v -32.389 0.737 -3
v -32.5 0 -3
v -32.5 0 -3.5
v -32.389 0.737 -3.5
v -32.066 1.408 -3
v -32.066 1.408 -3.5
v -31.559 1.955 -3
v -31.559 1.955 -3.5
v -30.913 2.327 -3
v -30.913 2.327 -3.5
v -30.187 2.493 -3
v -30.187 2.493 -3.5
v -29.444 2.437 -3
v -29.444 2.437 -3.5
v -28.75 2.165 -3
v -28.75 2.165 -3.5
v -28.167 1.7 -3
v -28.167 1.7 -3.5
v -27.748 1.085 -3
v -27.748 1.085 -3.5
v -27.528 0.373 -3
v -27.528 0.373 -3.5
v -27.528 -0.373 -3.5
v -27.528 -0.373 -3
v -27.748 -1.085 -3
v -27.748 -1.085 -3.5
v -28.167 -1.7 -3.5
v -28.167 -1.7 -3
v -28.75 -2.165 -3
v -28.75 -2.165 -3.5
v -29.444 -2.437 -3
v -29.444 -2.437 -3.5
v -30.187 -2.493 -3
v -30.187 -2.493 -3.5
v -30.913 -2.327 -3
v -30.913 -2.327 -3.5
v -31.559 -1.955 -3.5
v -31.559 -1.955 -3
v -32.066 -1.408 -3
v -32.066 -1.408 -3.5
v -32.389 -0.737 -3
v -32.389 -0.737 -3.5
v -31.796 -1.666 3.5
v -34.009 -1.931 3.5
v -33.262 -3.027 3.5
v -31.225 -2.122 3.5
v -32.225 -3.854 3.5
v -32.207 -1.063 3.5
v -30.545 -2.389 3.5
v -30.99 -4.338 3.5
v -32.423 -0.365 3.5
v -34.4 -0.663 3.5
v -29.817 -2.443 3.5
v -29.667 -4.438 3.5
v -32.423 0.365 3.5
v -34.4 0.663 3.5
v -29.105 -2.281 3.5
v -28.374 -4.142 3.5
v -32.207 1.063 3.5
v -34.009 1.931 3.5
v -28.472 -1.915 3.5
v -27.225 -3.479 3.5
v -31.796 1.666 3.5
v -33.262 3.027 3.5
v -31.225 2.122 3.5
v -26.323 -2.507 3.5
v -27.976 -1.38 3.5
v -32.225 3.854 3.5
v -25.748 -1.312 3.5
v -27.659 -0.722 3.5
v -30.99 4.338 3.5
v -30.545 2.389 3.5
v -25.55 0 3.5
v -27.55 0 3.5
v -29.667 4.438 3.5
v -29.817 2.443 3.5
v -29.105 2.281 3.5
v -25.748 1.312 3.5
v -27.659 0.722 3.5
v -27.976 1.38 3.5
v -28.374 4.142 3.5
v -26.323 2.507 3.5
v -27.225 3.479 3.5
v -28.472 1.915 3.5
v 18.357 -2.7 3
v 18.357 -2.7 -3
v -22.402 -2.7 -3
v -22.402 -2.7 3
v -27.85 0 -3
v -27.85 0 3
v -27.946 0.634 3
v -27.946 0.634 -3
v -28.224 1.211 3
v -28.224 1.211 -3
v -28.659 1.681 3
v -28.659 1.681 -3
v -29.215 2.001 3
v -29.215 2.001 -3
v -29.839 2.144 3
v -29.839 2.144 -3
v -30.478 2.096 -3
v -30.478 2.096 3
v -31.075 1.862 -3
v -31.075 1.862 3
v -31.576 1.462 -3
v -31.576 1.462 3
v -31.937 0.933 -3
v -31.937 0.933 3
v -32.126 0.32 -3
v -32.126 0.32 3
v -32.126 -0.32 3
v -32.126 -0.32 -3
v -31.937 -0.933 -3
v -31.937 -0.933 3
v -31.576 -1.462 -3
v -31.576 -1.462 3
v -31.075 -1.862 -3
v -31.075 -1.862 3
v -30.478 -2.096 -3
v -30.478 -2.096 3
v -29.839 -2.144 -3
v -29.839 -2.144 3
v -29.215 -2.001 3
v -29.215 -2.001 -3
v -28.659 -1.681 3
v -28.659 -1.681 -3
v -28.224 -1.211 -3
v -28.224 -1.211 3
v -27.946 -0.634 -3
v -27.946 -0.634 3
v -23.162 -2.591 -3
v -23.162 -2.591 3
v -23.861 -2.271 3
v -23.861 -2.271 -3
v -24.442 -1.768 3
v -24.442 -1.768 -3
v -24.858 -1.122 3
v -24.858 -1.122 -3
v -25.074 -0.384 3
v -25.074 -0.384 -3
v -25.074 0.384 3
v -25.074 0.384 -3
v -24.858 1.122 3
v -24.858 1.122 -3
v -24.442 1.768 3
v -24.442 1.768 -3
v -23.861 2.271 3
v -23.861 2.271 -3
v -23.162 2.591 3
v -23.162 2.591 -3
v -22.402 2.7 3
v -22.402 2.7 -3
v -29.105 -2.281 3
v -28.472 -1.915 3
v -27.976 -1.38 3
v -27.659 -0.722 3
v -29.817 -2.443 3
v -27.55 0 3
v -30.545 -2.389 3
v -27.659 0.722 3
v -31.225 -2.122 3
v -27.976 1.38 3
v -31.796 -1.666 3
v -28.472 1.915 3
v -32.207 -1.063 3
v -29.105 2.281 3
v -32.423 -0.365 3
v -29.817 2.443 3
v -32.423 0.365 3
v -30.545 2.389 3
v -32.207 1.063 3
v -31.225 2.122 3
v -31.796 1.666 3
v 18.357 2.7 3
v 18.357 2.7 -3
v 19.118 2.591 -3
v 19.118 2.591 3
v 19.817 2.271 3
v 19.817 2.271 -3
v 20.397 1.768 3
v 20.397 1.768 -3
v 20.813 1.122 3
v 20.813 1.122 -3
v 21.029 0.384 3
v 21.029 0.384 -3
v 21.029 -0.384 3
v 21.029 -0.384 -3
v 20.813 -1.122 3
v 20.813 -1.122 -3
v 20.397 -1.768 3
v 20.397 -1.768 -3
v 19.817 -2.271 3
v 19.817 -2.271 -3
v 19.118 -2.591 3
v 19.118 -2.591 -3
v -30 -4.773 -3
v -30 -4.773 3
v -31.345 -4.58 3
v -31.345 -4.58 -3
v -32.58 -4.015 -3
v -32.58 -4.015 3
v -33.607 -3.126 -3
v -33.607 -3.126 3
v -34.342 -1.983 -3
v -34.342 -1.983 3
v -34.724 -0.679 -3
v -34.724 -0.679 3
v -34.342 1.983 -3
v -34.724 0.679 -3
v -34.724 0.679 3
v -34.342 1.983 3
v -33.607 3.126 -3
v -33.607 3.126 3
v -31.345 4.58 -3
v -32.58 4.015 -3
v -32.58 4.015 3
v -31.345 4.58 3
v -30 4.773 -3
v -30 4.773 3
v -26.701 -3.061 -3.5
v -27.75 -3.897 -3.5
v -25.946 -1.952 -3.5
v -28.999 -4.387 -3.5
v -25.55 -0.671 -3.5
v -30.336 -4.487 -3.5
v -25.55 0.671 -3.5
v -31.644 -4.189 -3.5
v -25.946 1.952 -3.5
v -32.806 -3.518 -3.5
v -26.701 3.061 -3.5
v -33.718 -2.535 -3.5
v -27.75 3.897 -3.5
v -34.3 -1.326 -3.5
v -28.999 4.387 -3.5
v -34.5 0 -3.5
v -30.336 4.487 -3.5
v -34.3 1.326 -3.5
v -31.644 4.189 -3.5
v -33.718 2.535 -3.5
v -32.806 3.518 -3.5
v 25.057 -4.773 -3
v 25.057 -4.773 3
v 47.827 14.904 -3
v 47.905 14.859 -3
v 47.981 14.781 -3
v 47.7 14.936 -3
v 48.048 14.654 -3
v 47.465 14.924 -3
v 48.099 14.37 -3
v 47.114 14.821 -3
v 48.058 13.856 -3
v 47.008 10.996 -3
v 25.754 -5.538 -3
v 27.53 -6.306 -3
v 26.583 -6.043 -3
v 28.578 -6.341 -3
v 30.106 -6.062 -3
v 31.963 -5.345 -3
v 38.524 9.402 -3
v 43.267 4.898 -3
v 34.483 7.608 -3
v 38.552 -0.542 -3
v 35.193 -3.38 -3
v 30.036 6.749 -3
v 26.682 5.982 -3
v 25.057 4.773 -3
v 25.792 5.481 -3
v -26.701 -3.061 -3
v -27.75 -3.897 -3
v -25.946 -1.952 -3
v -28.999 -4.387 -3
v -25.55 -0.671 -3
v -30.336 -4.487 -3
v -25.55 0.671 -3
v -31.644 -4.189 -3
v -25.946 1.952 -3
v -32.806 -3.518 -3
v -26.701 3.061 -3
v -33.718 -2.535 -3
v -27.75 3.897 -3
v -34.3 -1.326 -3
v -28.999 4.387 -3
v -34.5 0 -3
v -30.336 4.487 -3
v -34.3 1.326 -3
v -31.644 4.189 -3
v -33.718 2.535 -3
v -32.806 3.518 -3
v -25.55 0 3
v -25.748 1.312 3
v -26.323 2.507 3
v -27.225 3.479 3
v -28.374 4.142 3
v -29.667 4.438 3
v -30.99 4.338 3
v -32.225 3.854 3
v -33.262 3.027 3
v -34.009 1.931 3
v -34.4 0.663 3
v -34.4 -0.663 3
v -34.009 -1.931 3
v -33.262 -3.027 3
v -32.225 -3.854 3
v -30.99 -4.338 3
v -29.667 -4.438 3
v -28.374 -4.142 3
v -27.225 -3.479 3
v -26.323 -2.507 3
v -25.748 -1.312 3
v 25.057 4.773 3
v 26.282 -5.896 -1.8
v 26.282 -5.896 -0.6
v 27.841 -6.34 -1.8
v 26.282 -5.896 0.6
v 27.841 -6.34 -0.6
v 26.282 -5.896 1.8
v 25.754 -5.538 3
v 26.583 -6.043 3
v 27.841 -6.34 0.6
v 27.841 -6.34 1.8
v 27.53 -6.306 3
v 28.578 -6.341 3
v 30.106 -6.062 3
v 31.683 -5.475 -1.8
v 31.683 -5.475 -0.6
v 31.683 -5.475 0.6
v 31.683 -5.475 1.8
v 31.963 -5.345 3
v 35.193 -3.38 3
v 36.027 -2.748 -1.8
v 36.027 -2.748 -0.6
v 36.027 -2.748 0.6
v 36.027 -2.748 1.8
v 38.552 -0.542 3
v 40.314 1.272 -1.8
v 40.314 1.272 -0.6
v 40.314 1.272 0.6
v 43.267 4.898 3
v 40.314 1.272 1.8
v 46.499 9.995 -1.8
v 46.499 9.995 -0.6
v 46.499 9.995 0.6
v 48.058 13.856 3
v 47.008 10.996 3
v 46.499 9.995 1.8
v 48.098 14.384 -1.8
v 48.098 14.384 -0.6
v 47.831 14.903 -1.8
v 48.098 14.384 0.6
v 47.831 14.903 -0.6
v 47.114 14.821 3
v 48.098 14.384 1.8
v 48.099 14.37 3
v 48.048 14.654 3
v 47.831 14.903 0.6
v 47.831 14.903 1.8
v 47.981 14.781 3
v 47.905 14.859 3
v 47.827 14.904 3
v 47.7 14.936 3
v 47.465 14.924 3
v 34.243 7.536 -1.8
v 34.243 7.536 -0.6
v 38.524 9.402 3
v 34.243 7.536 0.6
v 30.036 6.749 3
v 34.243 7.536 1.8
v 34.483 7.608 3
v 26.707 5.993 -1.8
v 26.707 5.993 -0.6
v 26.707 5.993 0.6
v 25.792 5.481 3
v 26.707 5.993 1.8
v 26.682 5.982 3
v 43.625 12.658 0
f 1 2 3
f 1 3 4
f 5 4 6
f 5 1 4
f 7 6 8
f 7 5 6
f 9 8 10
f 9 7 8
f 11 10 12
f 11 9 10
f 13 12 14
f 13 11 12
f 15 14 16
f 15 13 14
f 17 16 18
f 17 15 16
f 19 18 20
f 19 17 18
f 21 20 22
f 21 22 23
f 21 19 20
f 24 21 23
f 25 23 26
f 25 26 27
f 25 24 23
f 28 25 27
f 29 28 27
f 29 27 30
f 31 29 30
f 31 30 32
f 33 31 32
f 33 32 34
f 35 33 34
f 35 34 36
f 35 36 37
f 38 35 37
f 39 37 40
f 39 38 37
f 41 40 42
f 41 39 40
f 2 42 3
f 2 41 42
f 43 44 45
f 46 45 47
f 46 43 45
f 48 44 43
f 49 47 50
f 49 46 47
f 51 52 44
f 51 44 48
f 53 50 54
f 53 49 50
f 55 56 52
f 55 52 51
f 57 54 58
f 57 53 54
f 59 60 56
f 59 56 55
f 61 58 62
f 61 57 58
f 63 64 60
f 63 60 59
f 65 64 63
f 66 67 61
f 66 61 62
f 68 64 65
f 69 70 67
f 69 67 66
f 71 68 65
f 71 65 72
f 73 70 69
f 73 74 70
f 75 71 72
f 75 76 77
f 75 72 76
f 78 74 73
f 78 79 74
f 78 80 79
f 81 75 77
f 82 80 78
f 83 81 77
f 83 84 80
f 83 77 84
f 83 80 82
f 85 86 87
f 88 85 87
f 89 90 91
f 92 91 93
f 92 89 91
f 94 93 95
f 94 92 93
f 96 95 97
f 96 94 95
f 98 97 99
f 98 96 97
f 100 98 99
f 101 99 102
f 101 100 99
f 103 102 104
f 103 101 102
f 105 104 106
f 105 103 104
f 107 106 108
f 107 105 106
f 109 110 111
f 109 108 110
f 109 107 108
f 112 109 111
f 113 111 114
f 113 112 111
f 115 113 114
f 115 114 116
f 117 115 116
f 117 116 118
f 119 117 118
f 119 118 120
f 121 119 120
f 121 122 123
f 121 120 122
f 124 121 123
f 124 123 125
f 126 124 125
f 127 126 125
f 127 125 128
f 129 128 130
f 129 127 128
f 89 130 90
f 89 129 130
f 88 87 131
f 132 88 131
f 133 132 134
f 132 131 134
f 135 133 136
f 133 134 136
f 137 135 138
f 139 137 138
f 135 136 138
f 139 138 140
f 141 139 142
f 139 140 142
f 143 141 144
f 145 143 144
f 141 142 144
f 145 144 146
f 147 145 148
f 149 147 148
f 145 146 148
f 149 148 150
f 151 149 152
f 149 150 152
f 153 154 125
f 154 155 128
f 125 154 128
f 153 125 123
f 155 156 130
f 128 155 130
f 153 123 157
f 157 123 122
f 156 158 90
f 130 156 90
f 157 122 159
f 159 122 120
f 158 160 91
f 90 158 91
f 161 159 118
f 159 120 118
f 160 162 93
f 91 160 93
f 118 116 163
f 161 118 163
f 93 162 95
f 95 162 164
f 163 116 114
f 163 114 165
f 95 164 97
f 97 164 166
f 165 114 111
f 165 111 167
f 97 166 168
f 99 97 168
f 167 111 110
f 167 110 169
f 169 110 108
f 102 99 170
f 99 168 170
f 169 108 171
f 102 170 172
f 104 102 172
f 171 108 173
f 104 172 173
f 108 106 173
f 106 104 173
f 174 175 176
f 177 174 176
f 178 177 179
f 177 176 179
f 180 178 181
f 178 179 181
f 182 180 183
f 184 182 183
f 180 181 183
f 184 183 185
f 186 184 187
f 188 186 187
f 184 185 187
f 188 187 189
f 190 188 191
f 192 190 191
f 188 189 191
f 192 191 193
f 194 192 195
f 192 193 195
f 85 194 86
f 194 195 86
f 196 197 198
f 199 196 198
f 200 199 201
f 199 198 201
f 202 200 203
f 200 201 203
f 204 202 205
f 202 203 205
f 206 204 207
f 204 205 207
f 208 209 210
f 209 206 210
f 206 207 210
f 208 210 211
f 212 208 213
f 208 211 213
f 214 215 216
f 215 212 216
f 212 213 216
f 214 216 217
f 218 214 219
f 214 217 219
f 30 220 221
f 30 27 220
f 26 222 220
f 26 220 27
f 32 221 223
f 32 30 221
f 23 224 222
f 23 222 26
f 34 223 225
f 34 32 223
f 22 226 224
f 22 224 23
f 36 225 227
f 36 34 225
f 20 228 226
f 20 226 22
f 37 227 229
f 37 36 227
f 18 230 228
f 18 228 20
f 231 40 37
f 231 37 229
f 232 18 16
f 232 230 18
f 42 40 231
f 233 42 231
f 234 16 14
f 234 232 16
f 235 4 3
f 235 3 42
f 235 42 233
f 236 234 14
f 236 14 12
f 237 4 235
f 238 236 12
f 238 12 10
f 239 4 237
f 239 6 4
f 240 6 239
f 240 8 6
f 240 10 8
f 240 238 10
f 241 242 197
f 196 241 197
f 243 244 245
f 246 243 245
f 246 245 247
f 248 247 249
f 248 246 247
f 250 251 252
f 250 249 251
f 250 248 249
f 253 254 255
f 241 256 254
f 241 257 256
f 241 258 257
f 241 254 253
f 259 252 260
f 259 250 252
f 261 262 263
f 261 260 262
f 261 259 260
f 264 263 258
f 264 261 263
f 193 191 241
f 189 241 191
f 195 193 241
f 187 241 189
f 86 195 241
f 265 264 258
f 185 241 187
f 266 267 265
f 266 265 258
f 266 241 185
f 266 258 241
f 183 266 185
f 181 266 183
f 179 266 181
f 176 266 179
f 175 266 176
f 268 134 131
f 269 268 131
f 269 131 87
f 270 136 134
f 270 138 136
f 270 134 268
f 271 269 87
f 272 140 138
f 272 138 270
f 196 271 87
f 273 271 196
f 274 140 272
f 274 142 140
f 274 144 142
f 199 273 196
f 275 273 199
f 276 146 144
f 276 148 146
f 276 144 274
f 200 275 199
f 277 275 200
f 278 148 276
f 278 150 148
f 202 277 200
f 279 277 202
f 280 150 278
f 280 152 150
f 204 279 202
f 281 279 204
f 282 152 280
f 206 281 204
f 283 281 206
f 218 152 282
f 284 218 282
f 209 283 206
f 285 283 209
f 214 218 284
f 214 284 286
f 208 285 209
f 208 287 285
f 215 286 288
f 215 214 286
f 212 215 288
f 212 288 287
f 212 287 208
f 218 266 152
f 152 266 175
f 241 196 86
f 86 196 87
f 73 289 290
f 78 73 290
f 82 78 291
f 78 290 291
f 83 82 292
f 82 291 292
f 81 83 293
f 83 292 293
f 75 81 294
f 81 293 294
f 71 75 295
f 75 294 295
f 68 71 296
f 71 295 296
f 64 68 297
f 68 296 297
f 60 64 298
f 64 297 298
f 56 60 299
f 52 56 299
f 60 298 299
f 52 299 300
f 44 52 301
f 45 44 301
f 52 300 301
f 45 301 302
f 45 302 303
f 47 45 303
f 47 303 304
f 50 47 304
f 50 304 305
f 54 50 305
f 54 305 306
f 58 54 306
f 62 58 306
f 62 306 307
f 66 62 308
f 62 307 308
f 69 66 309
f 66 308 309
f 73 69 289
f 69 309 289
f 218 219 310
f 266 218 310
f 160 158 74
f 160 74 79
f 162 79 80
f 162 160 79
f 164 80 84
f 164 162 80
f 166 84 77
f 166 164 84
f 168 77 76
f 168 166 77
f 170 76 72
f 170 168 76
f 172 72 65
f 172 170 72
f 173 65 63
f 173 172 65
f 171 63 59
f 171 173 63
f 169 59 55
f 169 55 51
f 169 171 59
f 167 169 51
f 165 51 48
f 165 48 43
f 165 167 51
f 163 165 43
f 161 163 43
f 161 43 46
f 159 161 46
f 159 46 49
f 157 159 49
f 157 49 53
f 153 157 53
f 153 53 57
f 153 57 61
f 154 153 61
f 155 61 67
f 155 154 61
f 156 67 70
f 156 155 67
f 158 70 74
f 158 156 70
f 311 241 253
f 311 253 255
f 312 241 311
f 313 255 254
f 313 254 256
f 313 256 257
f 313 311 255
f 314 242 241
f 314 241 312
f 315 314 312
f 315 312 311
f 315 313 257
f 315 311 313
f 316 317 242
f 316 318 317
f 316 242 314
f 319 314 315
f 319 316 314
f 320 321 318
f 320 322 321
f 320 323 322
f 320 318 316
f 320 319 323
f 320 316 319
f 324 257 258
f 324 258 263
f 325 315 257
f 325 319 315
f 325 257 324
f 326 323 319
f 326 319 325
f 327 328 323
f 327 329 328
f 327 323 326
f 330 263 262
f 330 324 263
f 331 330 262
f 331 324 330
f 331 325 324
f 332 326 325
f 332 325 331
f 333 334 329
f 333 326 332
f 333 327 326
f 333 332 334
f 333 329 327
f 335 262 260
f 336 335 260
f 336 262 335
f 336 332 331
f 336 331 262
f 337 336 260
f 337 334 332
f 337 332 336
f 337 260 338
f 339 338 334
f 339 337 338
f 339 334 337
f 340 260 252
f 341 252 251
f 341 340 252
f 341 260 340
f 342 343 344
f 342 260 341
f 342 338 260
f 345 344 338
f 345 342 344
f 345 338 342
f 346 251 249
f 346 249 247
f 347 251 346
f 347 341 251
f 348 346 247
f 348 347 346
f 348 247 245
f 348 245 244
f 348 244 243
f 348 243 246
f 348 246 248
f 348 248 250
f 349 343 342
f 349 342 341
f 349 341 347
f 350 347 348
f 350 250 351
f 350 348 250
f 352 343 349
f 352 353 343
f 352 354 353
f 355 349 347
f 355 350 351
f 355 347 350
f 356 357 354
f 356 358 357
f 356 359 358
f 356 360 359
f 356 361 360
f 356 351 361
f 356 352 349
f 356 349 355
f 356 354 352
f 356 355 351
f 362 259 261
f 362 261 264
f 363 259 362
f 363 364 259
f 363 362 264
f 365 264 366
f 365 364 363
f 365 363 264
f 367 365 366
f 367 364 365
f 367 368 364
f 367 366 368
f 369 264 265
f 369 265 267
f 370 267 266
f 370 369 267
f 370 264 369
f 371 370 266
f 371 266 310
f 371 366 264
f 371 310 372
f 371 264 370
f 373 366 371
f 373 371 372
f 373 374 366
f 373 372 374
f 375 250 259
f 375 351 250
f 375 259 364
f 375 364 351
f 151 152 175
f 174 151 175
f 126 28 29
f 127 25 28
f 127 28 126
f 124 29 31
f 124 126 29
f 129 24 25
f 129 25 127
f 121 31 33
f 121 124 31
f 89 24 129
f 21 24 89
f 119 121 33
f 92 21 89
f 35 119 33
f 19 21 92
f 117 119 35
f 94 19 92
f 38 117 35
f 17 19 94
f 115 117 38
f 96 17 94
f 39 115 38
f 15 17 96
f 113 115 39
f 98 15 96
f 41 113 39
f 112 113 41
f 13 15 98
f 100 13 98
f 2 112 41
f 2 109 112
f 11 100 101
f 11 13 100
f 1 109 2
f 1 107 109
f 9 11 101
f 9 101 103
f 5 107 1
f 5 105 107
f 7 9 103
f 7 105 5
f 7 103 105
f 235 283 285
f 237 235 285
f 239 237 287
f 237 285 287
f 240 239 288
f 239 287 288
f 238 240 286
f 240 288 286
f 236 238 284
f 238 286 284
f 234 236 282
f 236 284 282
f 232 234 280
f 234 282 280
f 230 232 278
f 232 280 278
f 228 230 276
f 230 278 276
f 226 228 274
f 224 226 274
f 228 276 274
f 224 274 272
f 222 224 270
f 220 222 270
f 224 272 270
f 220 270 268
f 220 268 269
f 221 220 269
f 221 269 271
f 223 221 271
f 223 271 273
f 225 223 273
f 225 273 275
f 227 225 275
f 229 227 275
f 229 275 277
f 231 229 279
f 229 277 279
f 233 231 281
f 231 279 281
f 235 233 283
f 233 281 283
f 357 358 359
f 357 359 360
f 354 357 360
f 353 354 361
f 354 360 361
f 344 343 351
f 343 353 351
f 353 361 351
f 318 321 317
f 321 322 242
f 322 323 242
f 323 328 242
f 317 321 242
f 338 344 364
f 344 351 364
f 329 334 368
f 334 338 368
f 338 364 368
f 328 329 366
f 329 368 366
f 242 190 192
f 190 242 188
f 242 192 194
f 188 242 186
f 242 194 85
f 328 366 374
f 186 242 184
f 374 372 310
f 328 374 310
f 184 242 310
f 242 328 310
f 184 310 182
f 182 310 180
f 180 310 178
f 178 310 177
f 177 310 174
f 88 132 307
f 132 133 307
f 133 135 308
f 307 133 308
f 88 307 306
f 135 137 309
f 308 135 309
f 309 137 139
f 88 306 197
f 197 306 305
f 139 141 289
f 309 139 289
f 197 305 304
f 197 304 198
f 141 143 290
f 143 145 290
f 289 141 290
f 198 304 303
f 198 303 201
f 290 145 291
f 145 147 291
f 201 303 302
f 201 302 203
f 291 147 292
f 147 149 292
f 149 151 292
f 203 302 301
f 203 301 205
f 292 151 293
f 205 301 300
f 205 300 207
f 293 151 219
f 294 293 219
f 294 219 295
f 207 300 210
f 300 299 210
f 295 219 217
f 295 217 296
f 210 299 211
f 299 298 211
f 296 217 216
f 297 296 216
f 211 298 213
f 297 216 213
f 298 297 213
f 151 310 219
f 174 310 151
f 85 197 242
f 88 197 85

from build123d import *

# Parameters (mm, degrees)
EXTRUDE_1_DEPTH          = 3
SKETCH_2_R               = 2.15
CUT_EXTRUDE_2_DEPTH      = 10
CUT_EXTRUDE_2_DEPTH_BACK = 1
SKETCH_6_R               = 4.45
SKETCH_6_R_2             = 2.45
EXTRUDE_1_2_DEPTH        = 0.5
SKETCH_7_R               = 4.5
SKETCH_7_R_2             = 2.5
EXTRUDE_2_DEPTH          = 0.5
CUT_EXTRUDE_3_DEPTH      = 10
EXTRUDE_2_2_DEPTH        = 6


with BuildPart() as part:
    # 草图1 → Extrude 1 (new body, symmetric)
    with BuildSketch(Plane.XY):
        with BuildLine():
            Line((25.056911311, -4.773033008), (-34.943088689, -4.773033008))
            ThreePointArc((-34.943088689, -4.773033008), (-39.716121697, 0), (-34.943088689, 4.773033008))
            Line((-34.943088689, 4.773033008), (25.056911311, 4.773033008))
            Line((25.056911311, 4.773033008), (25.056911311, -4.773033008))
        make_face()
    extrude(amount=EXTRUDE_1_DEPTH, both=True)

    # 草图2 → 切除-拉伸2 (cut, two sides)
    with BuildSketch(Plane(origin=(0, -0.226966992, -3), x_dir=(1, 0, 0), z_dir=(0, 0, 1))) as cut_extrude_2_sk:
        with Locations((-30, 0.226966992)):
            Circle(SKETCH_2_R)
        with BuildLine():
            Line((-22.401694851, 2.926966992), (18.356911311, 2.926966992))
            ThreePointArc((18.356911311, 2.926966992), (21.056911311, 0.226966992), (18.356911311, -2.473033008))
            Line((18.356911311, -2.473033008), (-22.401694851, -2.473033008))
            ThreePointArc((-22.401694851, -2.473033008), (-25.101694851, 0.226966992), (-22.401694851, 2.926966992))
        make_face()
    extrude(amount=CUT_EXTRUDE_2_DEPTH, mode=Mode.SUBTRACT)
    extrude(cut_extrude_2_sk.sketch, amount=-CUT_EXTRUDE_2_DEPTH_BACK, mode=Mode.SUBTRACT)

    # 草图6 → Extrude 1 2 (add)
    with BuildSketch(Plane.XY.offset(3)):
        with Locations((-30, 0)):
            Circle(SKETCH_6_R)
        with Locations((-30, 0)):
            Circle(SKETCH_6_R_2, mode=Mode.SUBTRACT)
    extrude(amount=EXTRUDE_1_2_DEPTH)

    # 草图7 → Extrude 2 (add)
    with BuildSketch(Plane(origin=(0, 0, -3), x_dir=(-1, 0, 0), z_dir=(0, 0, -1))):
        with Locations((30, 0)):
            Circle(SKETCH_7_R)
        with Locations((30, 0)):
            Circle(SKETCH_7_R_2, mode=Mode.SUBTRACT)
    extrude(amount=EXTRUDE_2_DEPTH)

    # 草图9 → 切除-拉伸3 (cut)
    with BuildSketch(Plane.XY.offset(3)):
        with BuildLine():
            Line((-30, 4.773033008), (-45.254919606, 4.773033008))
            Line((-45.254919606, 4.773033008), (-45.254919606, -4.773033008))
            Line((-45.254919606, -4.773033008), (-30, -4.773033008))
            ThreePointArc((-30, -4.773033008), (-34.773033008, 0), (-30, 4.773033008))
        make_face()
    extrude(amount=-CUT_EXTRUDE_3_DEPTH, mode=Mode.SUBTRACT)

    # 草图11 → Extrude 2 2 (add)
    with BuildSketch(Plane.XY.offset(3)):
        with BuildLine():
            add(Edge.make_bspline(
                [(25.056911311, -4.773033008), (27.815239946, -8.737333347), (41.585070211, -0.864093582), (52.804357996, 21.672077098), (36.415875516, 5.496268281), (23.158409155, 7.58630405), (23.452448802, -2.467081791), (25.056911311, -4.773033008)],
                knots=[0, 0, 0, 0, 0.246515534, 0.480336102, 0.712513076, 0.856607031, 1, 1, 1, 1], degree=3))
        make_face()
    extrude(amount=-EXTRUDE_2_2_DEPTH)


solid = part.part
